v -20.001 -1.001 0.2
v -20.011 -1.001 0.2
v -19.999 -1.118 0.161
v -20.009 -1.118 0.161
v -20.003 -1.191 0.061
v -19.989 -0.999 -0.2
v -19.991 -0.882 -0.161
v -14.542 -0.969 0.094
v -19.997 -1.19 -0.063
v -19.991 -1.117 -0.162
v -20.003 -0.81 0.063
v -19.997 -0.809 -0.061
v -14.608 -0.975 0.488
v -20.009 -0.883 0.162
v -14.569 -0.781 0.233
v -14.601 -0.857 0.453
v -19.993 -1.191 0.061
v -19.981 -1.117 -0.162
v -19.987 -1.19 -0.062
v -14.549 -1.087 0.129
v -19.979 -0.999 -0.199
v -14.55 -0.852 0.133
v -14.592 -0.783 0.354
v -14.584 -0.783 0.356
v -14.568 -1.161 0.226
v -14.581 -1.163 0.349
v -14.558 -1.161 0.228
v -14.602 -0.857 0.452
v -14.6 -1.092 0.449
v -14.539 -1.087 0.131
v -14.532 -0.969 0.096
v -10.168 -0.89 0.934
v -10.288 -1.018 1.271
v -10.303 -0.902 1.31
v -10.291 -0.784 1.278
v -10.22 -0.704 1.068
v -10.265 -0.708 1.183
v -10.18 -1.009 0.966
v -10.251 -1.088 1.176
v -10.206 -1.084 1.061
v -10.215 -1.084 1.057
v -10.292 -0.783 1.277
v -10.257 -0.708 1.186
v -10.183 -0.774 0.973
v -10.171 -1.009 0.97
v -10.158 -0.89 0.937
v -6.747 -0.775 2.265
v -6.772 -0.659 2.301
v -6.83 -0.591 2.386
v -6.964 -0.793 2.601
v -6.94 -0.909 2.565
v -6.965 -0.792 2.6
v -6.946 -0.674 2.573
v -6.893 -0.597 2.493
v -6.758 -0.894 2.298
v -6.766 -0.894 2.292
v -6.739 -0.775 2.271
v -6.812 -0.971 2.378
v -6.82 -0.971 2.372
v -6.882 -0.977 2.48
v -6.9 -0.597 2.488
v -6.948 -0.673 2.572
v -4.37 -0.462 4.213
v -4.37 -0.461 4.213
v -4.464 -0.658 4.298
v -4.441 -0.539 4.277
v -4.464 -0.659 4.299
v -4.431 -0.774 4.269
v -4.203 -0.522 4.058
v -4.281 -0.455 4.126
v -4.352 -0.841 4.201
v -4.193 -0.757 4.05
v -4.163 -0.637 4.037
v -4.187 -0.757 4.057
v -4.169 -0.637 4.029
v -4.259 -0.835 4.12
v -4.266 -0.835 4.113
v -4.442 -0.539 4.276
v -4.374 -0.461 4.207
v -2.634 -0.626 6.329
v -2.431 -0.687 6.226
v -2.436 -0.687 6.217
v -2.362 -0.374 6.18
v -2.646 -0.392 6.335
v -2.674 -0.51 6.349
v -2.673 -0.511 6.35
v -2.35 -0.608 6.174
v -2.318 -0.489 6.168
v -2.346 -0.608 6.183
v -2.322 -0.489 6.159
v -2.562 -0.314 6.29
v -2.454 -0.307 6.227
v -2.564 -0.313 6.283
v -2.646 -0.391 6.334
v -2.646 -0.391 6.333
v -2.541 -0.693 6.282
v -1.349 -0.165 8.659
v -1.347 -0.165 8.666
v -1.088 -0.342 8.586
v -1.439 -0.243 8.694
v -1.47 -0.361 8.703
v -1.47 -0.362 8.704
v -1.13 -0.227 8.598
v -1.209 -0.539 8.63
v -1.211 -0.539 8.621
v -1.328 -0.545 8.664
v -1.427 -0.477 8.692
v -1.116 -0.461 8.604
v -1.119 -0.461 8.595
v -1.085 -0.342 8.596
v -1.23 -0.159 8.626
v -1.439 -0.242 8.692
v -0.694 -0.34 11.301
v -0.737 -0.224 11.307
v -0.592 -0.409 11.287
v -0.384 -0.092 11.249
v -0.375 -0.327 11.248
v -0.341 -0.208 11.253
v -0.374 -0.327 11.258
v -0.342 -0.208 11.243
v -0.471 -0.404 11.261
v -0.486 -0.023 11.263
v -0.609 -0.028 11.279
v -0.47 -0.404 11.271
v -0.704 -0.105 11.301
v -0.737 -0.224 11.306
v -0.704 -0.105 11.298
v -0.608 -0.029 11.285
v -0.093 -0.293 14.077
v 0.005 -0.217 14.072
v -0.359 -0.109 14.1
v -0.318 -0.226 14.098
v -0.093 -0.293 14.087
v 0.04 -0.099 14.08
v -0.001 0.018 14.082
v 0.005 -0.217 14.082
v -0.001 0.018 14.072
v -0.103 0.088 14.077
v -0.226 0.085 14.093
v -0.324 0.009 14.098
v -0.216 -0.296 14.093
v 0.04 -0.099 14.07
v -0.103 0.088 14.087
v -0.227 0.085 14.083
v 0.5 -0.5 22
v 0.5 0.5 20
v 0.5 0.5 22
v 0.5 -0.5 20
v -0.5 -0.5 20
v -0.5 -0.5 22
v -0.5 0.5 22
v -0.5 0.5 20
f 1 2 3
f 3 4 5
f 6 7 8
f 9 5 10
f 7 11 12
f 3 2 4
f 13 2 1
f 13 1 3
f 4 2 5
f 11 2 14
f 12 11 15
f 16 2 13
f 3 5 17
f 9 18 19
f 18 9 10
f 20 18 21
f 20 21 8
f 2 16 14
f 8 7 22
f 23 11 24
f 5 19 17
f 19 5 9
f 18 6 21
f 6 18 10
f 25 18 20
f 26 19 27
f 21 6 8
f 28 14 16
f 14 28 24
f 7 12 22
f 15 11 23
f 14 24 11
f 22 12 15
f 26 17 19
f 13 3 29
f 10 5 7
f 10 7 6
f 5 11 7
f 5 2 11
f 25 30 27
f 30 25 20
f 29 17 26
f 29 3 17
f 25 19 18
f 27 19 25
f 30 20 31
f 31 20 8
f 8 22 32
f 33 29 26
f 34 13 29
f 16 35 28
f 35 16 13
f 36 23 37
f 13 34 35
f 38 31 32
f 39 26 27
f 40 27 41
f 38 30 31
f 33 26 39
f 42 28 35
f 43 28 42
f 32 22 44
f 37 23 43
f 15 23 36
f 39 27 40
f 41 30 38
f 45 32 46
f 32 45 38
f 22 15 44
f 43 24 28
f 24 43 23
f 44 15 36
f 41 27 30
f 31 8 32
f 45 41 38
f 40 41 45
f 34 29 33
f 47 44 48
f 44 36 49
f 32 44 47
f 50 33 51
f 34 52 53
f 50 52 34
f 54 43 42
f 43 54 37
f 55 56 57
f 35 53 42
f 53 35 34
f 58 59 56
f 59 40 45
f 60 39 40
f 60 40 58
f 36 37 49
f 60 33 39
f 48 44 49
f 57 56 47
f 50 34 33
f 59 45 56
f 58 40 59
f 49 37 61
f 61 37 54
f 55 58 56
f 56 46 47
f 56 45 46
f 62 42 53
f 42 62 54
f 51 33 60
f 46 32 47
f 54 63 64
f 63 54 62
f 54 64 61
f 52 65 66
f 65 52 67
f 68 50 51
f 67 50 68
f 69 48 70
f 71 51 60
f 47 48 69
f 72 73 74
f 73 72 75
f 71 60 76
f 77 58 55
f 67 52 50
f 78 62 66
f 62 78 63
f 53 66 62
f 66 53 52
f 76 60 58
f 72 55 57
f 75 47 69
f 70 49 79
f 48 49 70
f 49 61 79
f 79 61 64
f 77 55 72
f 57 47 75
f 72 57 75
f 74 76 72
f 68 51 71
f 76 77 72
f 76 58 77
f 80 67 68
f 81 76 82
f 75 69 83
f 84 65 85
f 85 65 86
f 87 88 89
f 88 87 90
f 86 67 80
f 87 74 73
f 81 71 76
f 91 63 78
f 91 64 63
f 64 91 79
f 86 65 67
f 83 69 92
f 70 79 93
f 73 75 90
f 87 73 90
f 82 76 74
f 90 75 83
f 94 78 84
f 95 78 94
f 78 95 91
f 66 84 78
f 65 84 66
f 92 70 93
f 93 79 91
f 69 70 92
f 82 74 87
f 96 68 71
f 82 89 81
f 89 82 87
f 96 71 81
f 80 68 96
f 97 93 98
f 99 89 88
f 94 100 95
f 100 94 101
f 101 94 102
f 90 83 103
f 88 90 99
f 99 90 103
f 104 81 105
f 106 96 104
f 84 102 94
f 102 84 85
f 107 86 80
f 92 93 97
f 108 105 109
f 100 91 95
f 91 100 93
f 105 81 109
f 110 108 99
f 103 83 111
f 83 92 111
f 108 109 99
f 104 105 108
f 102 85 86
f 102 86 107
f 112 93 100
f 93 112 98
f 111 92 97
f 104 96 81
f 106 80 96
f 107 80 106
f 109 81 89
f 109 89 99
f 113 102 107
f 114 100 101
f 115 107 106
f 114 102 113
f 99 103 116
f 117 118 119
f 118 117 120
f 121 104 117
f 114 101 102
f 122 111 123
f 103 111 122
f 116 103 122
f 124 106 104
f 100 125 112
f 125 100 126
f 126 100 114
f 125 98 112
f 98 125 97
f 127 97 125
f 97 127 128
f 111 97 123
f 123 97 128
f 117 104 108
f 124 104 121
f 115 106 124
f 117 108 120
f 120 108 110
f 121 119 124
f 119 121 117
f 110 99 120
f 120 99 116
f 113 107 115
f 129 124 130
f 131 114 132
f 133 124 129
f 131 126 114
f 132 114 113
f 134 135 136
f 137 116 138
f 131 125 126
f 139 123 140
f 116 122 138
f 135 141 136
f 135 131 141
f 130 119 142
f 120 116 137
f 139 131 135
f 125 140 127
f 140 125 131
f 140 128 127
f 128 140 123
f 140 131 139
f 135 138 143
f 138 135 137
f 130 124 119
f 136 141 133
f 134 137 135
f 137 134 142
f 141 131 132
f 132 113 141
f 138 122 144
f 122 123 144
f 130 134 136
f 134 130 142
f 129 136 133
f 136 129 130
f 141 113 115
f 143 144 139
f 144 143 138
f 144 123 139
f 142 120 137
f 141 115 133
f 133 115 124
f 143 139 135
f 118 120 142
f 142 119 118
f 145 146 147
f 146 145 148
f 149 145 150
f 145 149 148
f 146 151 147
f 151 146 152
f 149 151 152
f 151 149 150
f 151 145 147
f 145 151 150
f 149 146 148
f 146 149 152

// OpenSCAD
function build_path_bezier2(A, dt = 0.05) = [
    for (t = [0:dt:1]) let(
        r = 1 - t,
        w = t / r,
        a = r * r,
        b = a * w, 
        c = b * w, 
        M = [a, 2 * b, c]
        ) M * A
];

function build_path_bezier3(A, dt = 0.05) = [ 
    for (t = [0:dt:1]) let(
        r = 1 - t,
        w = t / r,
        a = r * r * r,
        b = a * w, 
        c = b * w, 
        d = c * w,
        M = [a, 3 * b, 3 * c, d]
        ) M * A
];

module follow_path(path) {
    for(i = [0:len(path) - 2]) {
        p = [ path[i], path[i + 1], path[i + 2] ];
        v1 = p[1] - p[0];
        v2 = p[2] - p[1];
        n1 = v1 / norm(v1);
        n2 = v2 / norm(v2);
        a1 = [acos(n1.z), 0, acos(n1.x)];
        a2 = n2 ? [acos(n2.z), 0, acos(n2.x) ] : a1;
        hull() {
            translate(p[0]) rotate(a1) children();
            translate(p[1]) rotate(a2) children();
        }
    }
}

l = 20;
h = 2 + abs(cos(360 * $t)) * (l - 2);

path = build_path_bezier3([
    [-20, 0, 1],
    [0, 0, 1],
    [sqrt(l * l - h * h), h / 2, 0],
    [0, h, 0]
], 0.1);
rotate([90, 0, 0]) {
    follow_path(path) rotate([0, 90, 0]) cylinder(r = 0.2, h = 0.01, $fn = 10);
    translate([-0.5, h, -0.5]) cube([1, 2, 1]);
}
